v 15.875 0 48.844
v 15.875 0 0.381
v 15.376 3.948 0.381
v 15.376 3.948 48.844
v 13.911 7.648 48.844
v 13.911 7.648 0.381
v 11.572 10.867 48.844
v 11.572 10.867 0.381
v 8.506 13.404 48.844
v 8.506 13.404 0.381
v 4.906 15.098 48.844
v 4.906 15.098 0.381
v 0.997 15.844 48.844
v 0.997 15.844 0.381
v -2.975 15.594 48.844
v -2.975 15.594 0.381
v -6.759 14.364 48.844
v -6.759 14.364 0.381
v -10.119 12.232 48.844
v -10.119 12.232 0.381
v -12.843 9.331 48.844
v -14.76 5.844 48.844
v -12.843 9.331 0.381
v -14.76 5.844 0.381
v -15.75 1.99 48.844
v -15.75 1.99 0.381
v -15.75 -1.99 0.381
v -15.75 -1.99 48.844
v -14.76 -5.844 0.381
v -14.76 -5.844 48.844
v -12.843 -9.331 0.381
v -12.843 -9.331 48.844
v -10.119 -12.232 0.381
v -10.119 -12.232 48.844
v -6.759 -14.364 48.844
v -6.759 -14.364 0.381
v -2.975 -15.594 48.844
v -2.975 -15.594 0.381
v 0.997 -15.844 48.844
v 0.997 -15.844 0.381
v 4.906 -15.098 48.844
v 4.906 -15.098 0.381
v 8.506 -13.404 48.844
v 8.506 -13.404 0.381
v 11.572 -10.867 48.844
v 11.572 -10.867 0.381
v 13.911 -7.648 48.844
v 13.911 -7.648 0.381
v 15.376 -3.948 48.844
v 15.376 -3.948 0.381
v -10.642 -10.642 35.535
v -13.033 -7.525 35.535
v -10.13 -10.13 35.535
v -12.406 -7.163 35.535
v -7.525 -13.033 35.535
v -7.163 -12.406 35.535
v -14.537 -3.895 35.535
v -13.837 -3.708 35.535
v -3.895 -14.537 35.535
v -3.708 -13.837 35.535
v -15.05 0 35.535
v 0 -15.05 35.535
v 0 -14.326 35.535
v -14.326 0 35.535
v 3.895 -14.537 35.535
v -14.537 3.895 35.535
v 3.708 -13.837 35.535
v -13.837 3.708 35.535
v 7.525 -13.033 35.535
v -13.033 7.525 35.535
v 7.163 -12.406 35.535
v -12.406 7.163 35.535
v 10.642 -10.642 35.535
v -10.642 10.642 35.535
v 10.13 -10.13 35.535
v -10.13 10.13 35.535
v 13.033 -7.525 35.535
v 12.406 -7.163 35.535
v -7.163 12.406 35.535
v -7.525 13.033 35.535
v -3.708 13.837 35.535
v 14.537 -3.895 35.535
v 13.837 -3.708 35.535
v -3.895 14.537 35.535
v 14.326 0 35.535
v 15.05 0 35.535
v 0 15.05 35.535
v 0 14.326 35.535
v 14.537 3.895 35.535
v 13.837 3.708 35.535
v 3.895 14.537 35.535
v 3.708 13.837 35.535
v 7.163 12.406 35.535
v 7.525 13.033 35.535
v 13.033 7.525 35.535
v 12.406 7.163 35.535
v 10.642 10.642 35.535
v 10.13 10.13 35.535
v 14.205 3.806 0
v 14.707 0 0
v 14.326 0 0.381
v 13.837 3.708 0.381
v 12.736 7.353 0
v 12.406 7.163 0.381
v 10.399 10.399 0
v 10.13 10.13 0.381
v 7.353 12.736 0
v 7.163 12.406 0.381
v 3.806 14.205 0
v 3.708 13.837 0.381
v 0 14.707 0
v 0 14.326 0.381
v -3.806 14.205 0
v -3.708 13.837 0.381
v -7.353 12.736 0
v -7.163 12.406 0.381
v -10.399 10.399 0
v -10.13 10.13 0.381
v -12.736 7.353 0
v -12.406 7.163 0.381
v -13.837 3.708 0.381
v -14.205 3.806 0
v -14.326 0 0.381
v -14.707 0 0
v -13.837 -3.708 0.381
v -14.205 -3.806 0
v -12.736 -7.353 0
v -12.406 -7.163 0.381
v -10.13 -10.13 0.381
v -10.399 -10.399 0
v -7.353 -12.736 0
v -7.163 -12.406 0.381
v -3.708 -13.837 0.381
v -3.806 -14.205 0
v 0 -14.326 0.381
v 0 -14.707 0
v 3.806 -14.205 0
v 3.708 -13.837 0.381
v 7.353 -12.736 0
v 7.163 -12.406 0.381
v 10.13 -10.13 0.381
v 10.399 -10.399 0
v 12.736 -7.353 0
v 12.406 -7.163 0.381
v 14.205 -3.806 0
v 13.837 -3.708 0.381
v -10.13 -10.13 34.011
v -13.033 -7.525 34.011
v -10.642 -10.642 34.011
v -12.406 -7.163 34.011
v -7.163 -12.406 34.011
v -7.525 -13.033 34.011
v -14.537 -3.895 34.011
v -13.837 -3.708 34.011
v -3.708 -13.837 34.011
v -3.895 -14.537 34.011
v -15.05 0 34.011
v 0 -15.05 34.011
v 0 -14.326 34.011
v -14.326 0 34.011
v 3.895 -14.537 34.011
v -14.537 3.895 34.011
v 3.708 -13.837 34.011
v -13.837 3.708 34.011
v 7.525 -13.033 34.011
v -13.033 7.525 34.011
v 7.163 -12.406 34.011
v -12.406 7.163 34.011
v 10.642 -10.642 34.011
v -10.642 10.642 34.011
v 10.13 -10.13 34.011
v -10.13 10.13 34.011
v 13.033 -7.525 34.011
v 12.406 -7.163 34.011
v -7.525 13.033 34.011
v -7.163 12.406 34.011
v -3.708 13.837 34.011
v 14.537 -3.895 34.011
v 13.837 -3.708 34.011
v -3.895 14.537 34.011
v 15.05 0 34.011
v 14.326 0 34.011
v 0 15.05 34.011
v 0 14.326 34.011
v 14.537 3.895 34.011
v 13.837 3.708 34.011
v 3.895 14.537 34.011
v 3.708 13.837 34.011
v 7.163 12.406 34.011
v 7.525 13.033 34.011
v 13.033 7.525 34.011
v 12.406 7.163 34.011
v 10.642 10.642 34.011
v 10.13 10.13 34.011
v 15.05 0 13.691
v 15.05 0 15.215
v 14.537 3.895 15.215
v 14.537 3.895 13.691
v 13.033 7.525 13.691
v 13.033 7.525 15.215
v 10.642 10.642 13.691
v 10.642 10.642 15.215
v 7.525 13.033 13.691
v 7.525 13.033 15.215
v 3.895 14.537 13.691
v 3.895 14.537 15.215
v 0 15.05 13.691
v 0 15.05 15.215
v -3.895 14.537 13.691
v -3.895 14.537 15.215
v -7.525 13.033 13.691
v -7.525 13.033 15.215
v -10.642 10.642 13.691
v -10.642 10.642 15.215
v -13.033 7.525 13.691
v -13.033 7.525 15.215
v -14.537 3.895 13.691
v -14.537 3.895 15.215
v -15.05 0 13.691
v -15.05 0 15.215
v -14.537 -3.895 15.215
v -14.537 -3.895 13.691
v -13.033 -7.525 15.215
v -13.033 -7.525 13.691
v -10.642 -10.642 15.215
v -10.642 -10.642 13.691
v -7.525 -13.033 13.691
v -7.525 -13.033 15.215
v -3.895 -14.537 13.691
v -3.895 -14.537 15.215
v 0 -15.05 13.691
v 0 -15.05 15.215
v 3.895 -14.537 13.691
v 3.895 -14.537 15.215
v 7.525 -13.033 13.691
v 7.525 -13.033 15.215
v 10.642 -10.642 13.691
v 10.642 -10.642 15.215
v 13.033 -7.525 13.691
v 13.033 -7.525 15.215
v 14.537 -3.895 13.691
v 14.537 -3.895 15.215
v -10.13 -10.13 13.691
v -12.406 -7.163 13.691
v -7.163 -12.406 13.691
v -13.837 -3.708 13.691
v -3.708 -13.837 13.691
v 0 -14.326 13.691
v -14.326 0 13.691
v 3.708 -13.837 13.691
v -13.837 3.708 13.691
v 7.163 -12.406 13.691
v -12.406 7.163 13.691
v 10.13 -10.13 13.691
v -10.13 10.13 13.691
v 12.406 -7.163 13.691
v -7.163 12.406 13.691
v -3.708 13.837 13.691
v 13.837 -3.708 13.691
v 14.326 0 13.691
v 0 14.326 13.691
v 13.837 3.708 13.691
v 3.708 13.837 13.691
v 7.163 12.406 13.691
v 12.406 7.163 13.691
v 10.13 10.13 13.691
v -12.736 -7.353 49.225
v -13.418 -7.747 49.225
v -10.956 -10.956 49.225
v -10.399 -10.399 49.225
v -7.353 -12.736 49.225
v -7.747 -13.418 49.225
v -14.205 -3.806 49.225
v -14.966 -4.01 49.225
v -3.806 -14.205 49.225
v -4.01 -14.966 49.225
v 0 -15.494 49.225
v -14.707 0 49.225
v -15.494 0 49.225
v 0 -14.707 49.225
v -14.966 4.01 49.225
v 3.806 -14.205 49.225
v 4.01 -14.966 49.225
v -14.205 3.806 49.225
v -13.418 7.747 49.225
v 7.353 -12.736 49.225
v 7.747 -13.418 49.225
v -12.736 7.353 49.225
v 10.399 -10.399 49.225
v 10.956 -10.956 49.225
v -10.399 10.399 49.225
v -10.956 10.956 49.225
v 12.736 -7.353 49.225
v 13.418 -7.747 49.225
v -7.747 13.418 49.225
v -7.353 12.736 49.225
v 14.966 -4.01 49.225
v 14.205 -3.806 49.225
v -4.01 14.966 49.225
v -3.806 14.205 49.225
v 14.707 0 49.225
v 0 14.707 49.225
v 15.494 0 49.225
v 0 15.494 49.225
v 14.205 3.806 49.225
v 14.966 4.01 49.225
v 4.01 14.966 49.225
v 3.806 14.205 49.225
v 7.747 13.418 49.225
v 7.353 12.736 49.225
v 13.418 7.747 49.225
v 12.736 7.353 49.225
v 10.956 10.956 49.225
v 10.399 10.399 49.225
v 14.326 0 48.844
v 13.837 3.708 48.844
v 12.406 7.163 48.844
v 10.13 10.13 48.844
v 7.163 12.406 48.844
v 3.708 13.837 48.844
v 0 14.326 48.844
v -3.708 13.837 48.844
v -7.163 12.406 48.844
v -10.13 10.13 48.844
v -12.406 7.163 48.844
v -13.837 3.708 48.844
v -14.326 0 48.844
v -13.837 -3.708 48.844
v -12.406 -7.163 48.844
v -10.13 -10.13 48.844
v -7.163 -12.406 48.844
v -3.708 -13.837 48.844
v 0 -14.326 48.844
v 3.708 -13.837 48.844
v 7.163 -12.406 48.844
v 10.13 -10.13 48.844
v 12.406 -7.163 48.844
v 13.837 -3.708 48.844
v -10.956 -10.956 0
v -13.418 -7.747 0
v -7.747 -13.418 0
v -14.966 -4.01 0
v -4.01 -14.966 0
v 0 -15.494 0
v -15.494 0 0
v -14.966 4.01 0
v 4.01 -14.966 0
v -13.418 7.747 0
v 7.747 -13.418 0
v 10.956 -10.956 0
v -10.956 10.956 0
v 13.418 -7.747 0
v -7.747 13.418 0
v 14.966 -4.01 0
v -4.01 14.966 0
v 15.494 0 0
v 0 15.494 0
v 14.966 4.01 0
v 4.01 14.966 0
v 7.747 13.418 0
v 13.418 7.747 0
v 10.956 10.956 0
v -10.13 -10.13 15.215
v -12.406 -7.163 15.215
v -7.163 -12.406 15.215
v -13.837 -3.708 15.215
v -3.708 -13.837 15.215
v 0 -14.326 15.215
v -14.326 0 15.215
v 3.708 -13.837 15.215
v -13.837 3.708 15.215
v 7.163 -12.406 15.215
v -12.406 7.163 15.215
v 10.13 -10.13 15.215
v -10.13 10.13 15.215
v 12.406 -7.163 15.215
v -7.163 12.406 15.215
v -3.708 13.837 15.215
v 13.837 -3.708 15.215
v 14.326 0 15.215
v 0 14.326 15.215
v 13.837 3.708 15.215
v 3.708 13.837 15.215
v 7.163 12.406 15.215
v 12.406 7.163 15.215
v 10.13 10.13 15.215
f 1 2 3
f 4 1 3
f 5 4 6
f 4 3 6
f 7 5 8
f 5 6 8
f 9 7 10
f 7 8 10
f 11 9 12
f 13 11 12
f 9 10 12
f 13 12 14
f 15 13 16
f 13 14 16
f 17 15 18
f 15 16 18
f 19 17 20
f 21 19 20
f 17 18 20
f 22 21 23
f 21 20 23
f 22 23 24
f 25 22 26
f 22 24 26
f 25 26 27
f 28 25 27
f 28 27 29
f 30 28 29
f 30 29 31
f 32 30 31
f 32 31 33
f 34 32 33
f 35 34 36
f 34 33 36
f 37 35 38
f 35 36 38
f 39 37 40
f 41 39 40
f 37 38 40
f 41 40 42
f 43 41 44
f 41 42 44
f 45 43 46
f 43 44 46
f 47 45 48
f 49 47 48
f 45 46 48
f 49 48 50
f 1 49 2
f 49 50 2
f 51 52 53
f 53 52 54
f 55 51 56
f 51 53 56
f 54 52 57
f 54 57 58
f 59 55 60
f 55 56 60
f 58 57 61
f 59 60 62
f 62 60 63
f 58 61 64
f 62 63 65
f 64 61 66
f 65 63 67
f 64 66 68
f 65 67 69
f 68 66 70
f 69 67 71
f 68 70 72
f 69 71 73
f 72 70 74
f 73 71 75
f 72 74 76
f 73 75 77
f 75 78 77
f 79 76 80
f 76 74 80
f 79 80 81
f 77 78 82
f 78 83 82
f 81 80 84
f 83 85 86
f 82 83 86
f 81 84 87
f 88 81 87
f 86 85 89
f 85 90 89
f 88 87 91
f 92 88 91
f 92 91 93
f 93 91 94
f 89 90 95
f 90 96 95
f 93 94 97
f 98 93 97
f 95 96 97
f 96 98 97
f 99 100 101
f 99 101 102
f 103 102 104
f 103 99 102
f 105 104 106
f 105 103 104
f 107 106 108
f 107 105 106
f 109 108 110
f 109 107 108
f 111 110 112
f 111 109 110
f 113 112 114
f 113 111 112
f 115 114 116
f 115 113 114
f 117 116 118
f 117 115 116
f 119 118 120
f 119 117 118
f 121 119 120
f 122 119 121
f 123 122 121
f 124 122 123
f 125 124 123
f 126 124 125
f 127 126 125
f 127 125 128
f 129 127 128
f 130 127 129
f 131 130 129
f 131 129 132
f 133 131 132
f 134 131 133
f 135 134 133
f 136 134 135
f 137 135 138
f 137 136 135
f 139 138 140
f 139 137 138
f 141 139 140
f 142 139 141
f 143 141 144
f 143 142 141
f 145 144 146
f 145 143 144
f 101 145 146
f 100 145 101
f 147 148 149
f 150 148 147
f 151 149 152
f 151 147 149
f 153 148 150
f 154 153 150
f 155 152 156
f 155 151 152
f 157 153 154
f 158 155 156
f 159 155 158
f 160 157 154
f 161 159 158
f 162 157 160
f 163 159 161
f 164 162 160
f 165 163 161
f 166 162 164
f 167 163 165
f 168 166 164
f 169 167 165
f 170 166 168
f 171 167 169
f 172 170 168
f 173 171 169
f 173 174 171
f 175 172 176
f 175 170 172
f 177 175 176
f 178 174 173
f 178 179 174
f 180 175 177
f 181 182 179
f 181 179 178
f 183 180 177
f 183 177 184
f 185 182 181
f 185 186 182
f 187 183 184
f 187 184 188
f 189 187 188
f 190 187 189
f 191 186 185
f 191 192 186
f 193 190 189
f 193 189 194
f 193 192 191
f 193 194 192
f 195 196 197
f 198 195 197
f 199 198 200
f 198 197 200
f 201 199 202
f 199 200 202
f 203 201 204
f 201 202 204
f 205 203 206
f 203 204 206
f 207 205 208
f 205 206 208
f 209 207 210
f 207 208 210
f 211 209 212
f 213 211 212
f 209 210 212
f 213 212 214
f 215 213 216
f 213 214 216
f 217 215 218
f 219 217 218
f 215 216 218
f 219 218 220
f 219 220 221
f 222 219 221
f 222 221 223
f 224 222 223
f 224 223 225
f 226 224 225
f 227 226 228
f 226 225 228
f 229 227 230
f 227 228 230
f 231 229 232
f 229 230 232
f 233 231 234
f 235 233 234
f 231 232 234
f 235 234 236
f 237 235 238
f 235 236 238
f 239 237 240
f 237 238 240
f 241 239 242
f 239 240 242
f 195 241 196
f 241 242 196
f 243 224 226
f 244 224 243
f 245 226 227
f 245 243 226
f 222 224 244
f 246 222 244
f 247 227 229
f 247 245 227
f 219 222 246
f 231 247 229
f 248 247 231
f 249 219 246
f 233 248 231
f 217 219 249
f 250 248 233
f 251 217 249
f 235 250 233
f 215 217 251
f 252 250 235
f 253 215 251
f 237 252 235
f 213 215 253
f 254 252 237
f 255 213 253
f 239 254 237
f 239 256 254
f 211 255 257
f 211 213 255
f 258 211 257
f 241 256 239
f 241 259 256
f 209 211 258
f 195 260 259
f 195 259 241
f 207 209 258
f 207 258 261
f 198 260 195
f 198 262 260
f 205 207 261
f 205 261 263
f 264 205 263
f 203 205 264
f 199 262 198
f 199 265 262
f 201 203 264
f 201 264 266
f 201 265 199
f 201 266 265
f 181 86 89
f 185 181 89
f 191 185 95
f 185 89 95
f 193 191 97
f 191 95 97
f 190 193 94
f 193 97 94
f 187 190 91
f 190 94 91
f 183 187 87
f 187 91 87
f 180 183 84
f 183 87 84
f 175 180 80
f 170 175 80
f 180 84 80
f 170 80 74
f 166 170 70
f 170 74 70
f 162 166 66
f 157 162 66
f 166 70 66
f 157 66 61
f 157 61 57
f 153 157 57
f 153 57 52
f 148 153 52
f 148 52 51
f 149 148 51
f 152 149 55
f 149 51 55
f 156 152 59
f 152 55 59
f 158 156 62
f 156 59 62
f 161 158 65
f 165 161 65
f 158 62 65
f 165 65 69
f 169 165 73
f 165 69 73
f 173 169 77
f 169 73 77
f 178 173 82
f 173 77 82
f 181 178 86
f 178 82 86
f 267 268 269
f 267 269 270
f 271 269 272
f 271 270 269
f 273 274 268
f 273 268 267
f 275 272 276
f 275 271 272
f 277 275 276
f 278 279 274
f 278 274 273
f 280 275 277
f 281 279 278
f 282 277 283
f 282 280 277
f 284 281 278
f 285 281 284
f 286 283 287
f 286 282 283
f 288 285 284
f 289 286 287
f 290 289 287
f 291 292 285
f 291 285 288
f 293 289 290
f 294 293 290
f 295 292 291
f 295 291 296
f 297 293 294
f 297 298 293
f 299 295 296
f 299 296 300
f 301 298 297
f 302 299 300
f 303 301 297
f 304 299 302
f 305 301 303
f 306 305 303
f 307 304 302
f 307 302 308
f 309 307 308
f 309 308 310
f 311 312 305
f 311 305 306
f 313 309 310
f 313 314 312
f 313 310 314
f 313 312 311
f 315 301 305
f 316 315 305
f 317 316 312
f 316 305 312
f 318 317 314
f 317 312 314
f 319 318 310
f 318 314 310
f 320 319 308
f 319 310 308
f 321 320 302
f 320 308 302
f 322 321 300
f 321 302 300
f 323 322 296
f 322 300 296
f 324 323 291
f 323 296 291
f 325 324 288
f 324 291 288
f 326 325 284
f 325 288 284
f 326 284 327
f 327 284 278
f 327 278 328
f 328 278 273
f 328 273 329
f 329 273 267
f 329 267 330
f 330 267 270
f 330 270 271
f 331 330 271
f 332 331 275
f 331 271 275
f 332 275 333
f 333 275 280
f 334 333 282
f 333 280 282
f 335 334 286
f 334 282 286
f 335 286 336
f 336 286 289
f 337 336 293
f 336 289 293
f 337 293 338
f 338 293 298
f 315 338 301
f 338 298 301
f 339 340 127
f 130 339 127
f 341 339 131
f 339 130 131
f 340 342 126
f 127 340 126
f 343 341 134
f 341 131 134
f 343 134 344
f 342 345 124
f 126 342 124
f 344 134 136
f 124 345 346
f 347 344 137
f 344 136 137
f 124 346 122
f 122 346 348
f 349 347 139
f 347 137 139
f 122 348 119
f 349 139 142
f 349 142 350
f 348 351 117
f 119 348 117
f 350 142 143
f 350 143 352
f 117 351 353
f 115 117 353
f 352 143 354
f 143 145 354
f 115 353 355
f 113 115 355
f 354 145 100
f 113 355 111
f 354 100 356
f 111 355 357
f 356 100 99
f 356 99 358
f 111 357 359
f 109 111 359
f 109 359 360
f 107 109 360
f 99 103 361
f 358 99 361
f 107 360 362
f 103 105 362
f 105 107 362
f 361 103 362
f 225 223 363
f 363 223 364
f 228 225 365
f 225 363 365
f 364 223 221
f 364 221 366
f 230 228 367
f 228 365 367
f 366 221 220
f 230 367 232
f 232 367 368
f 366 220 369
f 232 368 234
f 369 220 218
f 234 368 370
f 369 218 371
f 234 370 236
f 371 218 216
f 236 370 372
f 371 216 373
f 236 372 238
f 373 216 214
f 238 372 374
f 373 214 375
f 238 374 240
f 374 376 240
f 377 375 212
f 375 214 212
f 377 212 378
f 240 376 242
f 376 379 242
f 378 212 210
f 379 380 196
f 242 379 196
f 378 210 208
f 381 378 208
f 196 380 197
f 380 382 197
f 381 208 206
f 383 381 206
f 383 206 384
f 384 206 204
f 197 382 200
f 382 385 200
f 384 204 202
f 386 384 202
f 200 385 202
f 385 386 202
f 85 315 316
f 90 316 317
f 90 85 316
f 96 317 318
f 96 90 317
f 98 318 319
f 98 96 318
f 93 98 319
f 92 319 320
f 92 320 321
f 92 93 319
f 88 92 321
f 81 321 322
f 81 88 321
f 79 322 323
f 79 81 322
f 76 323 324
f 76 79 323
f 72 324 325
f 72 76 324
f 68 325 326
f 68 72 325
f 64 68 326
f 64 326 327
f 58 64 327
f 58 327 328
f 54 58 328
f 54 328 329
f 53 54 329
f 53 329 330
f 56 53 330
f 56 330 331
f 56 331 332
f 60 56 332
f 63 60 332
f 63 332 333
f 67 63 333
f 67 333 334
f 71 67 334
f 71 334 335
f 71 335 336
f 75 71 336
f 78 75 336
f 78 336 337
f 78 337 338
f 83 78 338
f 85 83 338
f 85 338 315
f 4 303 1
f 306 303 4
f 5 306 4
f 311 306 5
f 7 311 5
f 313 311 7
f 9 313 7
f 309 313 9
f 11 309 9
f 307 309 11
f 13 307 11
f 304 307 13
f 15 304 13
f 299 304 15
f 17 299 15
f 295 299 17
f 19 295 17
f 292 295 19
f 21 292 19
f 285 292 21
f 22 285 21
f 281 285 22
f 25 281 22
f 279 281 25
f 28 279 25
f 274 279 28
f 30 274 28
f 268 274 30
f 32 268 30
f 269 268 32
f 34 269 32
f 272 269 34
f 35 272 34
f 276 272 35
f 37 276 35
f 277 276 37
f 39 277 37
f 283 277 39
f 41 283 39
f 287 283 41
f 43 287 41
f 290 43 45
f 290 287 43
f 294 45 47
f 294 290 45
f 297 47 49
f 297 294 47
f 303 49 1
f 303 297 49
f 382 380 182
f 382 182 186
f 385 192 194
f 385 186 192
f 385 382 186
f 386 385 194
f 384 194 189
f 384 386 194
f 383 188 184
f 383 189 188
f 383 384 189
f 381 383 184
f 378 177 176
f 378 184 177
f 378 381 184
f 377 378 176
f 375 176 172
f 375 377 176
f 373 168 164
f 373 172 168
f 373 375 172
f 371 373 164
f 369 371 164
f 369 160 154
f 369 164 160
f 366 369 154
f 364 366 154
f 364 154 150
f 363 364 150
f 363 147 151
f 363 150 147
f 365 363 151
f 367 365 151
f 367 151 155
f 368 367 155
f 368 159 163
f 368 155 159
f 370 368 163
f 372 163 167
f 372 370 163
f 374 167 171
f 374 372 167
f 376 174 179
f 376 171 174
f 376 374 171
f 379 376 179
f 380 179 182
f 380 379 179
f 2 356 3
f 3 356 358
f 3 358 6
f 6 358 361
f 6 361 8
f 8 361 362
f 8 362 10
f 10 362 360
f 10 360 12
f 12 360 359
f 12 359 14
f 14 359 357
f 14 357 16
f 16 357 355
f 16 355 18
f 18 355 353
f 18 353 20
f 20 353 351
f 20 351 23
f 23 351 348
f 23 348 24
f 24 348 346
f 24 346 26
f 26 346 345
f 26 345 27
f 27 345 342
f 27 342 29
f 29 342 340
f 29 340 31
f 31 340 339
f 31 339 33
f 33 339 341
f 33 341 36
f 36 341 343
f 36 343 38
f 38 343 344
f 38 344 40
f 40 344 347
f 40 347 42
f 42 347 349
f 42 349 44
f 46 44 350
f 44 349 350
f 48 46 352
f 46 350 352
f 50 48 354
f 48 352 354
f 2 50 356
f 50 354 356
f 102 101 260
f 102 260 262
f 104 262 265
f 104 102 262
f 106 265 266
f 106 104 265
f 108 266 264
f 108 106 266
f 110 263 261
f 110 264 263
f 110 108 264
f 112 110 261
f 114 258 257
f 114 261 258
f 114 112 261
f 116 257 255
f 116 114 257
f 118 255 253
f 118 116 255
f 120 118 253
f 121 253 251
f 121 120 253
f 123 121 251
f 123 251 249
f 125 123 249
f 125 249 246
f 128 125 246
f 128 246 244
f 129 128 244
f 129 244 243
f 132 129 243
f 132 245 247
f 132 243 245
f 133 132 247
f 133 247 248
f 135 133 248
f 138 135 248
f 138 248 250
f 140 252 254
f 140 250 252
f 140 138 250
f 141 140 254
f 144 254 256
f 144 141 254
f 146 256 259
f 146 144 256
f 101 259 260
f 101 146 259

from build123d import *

# Parameters (mm, degrees)
SKETCH1_R          = 15.875
SKETCH1_R_2        = 14.3256
BASE_EXTRUDE_DEPTH = 49.2252
CHAMFER1_SIZE      = 0.381
SKETCH2_R          = 15.0495
CUT_EXTRUDE1_DEPTH = 1.524
CUT_EXTRUDE2_START = 1.524
SKETCH3_R          = 15.0495
CUT_EXTRUDE2_DEPTH = 1.524


with BuildPart() as part:
    # Sketch1 → Base-Extrude (new body)
    with BuildSketch(Plane.XY):
        Circle(SKETCH1_R)
        Circle(SKETCH1_R_2, mode=Mode.SUBTRACT)
    extrude(amount=BASE_EXTRUDE_DEPTH)

    # Chamfer1
    chamfer1_edges = [part.edges().sort_by_distance(p)[0] for p in [
        (-15.875, 0, 0),
        (-15.875, 0, 49.2252),
        (-14.3256, 0, 0),
        (-14.3256, 0, 49.2252),
    ]]
    chamfer(chamfer1_edges, length=CHAMFER1_SIZE)

    # Sketch2 → Cut-Extrude1 (cut)
    with BuildSketch(Plane.XY.offset(15.2146)):
        Circle(SKETCH2_R)
    extrude(amount=-CUT_EXTRUDE1_DEPTH, mode=Mode.SUBTRACT)

    # Sketch3 → Cut-Extrude2 (cut)
    with BuildSketch(Plane.XY.offset(34.0106).offset(CUT_EXTRUDE2_START)):
        Circle(SKETCH3_R)
    extrude(amount=-CUT_EXTRUDE2_DEPTH, mode=Mode.SUBTRACT)


solid = part.part
